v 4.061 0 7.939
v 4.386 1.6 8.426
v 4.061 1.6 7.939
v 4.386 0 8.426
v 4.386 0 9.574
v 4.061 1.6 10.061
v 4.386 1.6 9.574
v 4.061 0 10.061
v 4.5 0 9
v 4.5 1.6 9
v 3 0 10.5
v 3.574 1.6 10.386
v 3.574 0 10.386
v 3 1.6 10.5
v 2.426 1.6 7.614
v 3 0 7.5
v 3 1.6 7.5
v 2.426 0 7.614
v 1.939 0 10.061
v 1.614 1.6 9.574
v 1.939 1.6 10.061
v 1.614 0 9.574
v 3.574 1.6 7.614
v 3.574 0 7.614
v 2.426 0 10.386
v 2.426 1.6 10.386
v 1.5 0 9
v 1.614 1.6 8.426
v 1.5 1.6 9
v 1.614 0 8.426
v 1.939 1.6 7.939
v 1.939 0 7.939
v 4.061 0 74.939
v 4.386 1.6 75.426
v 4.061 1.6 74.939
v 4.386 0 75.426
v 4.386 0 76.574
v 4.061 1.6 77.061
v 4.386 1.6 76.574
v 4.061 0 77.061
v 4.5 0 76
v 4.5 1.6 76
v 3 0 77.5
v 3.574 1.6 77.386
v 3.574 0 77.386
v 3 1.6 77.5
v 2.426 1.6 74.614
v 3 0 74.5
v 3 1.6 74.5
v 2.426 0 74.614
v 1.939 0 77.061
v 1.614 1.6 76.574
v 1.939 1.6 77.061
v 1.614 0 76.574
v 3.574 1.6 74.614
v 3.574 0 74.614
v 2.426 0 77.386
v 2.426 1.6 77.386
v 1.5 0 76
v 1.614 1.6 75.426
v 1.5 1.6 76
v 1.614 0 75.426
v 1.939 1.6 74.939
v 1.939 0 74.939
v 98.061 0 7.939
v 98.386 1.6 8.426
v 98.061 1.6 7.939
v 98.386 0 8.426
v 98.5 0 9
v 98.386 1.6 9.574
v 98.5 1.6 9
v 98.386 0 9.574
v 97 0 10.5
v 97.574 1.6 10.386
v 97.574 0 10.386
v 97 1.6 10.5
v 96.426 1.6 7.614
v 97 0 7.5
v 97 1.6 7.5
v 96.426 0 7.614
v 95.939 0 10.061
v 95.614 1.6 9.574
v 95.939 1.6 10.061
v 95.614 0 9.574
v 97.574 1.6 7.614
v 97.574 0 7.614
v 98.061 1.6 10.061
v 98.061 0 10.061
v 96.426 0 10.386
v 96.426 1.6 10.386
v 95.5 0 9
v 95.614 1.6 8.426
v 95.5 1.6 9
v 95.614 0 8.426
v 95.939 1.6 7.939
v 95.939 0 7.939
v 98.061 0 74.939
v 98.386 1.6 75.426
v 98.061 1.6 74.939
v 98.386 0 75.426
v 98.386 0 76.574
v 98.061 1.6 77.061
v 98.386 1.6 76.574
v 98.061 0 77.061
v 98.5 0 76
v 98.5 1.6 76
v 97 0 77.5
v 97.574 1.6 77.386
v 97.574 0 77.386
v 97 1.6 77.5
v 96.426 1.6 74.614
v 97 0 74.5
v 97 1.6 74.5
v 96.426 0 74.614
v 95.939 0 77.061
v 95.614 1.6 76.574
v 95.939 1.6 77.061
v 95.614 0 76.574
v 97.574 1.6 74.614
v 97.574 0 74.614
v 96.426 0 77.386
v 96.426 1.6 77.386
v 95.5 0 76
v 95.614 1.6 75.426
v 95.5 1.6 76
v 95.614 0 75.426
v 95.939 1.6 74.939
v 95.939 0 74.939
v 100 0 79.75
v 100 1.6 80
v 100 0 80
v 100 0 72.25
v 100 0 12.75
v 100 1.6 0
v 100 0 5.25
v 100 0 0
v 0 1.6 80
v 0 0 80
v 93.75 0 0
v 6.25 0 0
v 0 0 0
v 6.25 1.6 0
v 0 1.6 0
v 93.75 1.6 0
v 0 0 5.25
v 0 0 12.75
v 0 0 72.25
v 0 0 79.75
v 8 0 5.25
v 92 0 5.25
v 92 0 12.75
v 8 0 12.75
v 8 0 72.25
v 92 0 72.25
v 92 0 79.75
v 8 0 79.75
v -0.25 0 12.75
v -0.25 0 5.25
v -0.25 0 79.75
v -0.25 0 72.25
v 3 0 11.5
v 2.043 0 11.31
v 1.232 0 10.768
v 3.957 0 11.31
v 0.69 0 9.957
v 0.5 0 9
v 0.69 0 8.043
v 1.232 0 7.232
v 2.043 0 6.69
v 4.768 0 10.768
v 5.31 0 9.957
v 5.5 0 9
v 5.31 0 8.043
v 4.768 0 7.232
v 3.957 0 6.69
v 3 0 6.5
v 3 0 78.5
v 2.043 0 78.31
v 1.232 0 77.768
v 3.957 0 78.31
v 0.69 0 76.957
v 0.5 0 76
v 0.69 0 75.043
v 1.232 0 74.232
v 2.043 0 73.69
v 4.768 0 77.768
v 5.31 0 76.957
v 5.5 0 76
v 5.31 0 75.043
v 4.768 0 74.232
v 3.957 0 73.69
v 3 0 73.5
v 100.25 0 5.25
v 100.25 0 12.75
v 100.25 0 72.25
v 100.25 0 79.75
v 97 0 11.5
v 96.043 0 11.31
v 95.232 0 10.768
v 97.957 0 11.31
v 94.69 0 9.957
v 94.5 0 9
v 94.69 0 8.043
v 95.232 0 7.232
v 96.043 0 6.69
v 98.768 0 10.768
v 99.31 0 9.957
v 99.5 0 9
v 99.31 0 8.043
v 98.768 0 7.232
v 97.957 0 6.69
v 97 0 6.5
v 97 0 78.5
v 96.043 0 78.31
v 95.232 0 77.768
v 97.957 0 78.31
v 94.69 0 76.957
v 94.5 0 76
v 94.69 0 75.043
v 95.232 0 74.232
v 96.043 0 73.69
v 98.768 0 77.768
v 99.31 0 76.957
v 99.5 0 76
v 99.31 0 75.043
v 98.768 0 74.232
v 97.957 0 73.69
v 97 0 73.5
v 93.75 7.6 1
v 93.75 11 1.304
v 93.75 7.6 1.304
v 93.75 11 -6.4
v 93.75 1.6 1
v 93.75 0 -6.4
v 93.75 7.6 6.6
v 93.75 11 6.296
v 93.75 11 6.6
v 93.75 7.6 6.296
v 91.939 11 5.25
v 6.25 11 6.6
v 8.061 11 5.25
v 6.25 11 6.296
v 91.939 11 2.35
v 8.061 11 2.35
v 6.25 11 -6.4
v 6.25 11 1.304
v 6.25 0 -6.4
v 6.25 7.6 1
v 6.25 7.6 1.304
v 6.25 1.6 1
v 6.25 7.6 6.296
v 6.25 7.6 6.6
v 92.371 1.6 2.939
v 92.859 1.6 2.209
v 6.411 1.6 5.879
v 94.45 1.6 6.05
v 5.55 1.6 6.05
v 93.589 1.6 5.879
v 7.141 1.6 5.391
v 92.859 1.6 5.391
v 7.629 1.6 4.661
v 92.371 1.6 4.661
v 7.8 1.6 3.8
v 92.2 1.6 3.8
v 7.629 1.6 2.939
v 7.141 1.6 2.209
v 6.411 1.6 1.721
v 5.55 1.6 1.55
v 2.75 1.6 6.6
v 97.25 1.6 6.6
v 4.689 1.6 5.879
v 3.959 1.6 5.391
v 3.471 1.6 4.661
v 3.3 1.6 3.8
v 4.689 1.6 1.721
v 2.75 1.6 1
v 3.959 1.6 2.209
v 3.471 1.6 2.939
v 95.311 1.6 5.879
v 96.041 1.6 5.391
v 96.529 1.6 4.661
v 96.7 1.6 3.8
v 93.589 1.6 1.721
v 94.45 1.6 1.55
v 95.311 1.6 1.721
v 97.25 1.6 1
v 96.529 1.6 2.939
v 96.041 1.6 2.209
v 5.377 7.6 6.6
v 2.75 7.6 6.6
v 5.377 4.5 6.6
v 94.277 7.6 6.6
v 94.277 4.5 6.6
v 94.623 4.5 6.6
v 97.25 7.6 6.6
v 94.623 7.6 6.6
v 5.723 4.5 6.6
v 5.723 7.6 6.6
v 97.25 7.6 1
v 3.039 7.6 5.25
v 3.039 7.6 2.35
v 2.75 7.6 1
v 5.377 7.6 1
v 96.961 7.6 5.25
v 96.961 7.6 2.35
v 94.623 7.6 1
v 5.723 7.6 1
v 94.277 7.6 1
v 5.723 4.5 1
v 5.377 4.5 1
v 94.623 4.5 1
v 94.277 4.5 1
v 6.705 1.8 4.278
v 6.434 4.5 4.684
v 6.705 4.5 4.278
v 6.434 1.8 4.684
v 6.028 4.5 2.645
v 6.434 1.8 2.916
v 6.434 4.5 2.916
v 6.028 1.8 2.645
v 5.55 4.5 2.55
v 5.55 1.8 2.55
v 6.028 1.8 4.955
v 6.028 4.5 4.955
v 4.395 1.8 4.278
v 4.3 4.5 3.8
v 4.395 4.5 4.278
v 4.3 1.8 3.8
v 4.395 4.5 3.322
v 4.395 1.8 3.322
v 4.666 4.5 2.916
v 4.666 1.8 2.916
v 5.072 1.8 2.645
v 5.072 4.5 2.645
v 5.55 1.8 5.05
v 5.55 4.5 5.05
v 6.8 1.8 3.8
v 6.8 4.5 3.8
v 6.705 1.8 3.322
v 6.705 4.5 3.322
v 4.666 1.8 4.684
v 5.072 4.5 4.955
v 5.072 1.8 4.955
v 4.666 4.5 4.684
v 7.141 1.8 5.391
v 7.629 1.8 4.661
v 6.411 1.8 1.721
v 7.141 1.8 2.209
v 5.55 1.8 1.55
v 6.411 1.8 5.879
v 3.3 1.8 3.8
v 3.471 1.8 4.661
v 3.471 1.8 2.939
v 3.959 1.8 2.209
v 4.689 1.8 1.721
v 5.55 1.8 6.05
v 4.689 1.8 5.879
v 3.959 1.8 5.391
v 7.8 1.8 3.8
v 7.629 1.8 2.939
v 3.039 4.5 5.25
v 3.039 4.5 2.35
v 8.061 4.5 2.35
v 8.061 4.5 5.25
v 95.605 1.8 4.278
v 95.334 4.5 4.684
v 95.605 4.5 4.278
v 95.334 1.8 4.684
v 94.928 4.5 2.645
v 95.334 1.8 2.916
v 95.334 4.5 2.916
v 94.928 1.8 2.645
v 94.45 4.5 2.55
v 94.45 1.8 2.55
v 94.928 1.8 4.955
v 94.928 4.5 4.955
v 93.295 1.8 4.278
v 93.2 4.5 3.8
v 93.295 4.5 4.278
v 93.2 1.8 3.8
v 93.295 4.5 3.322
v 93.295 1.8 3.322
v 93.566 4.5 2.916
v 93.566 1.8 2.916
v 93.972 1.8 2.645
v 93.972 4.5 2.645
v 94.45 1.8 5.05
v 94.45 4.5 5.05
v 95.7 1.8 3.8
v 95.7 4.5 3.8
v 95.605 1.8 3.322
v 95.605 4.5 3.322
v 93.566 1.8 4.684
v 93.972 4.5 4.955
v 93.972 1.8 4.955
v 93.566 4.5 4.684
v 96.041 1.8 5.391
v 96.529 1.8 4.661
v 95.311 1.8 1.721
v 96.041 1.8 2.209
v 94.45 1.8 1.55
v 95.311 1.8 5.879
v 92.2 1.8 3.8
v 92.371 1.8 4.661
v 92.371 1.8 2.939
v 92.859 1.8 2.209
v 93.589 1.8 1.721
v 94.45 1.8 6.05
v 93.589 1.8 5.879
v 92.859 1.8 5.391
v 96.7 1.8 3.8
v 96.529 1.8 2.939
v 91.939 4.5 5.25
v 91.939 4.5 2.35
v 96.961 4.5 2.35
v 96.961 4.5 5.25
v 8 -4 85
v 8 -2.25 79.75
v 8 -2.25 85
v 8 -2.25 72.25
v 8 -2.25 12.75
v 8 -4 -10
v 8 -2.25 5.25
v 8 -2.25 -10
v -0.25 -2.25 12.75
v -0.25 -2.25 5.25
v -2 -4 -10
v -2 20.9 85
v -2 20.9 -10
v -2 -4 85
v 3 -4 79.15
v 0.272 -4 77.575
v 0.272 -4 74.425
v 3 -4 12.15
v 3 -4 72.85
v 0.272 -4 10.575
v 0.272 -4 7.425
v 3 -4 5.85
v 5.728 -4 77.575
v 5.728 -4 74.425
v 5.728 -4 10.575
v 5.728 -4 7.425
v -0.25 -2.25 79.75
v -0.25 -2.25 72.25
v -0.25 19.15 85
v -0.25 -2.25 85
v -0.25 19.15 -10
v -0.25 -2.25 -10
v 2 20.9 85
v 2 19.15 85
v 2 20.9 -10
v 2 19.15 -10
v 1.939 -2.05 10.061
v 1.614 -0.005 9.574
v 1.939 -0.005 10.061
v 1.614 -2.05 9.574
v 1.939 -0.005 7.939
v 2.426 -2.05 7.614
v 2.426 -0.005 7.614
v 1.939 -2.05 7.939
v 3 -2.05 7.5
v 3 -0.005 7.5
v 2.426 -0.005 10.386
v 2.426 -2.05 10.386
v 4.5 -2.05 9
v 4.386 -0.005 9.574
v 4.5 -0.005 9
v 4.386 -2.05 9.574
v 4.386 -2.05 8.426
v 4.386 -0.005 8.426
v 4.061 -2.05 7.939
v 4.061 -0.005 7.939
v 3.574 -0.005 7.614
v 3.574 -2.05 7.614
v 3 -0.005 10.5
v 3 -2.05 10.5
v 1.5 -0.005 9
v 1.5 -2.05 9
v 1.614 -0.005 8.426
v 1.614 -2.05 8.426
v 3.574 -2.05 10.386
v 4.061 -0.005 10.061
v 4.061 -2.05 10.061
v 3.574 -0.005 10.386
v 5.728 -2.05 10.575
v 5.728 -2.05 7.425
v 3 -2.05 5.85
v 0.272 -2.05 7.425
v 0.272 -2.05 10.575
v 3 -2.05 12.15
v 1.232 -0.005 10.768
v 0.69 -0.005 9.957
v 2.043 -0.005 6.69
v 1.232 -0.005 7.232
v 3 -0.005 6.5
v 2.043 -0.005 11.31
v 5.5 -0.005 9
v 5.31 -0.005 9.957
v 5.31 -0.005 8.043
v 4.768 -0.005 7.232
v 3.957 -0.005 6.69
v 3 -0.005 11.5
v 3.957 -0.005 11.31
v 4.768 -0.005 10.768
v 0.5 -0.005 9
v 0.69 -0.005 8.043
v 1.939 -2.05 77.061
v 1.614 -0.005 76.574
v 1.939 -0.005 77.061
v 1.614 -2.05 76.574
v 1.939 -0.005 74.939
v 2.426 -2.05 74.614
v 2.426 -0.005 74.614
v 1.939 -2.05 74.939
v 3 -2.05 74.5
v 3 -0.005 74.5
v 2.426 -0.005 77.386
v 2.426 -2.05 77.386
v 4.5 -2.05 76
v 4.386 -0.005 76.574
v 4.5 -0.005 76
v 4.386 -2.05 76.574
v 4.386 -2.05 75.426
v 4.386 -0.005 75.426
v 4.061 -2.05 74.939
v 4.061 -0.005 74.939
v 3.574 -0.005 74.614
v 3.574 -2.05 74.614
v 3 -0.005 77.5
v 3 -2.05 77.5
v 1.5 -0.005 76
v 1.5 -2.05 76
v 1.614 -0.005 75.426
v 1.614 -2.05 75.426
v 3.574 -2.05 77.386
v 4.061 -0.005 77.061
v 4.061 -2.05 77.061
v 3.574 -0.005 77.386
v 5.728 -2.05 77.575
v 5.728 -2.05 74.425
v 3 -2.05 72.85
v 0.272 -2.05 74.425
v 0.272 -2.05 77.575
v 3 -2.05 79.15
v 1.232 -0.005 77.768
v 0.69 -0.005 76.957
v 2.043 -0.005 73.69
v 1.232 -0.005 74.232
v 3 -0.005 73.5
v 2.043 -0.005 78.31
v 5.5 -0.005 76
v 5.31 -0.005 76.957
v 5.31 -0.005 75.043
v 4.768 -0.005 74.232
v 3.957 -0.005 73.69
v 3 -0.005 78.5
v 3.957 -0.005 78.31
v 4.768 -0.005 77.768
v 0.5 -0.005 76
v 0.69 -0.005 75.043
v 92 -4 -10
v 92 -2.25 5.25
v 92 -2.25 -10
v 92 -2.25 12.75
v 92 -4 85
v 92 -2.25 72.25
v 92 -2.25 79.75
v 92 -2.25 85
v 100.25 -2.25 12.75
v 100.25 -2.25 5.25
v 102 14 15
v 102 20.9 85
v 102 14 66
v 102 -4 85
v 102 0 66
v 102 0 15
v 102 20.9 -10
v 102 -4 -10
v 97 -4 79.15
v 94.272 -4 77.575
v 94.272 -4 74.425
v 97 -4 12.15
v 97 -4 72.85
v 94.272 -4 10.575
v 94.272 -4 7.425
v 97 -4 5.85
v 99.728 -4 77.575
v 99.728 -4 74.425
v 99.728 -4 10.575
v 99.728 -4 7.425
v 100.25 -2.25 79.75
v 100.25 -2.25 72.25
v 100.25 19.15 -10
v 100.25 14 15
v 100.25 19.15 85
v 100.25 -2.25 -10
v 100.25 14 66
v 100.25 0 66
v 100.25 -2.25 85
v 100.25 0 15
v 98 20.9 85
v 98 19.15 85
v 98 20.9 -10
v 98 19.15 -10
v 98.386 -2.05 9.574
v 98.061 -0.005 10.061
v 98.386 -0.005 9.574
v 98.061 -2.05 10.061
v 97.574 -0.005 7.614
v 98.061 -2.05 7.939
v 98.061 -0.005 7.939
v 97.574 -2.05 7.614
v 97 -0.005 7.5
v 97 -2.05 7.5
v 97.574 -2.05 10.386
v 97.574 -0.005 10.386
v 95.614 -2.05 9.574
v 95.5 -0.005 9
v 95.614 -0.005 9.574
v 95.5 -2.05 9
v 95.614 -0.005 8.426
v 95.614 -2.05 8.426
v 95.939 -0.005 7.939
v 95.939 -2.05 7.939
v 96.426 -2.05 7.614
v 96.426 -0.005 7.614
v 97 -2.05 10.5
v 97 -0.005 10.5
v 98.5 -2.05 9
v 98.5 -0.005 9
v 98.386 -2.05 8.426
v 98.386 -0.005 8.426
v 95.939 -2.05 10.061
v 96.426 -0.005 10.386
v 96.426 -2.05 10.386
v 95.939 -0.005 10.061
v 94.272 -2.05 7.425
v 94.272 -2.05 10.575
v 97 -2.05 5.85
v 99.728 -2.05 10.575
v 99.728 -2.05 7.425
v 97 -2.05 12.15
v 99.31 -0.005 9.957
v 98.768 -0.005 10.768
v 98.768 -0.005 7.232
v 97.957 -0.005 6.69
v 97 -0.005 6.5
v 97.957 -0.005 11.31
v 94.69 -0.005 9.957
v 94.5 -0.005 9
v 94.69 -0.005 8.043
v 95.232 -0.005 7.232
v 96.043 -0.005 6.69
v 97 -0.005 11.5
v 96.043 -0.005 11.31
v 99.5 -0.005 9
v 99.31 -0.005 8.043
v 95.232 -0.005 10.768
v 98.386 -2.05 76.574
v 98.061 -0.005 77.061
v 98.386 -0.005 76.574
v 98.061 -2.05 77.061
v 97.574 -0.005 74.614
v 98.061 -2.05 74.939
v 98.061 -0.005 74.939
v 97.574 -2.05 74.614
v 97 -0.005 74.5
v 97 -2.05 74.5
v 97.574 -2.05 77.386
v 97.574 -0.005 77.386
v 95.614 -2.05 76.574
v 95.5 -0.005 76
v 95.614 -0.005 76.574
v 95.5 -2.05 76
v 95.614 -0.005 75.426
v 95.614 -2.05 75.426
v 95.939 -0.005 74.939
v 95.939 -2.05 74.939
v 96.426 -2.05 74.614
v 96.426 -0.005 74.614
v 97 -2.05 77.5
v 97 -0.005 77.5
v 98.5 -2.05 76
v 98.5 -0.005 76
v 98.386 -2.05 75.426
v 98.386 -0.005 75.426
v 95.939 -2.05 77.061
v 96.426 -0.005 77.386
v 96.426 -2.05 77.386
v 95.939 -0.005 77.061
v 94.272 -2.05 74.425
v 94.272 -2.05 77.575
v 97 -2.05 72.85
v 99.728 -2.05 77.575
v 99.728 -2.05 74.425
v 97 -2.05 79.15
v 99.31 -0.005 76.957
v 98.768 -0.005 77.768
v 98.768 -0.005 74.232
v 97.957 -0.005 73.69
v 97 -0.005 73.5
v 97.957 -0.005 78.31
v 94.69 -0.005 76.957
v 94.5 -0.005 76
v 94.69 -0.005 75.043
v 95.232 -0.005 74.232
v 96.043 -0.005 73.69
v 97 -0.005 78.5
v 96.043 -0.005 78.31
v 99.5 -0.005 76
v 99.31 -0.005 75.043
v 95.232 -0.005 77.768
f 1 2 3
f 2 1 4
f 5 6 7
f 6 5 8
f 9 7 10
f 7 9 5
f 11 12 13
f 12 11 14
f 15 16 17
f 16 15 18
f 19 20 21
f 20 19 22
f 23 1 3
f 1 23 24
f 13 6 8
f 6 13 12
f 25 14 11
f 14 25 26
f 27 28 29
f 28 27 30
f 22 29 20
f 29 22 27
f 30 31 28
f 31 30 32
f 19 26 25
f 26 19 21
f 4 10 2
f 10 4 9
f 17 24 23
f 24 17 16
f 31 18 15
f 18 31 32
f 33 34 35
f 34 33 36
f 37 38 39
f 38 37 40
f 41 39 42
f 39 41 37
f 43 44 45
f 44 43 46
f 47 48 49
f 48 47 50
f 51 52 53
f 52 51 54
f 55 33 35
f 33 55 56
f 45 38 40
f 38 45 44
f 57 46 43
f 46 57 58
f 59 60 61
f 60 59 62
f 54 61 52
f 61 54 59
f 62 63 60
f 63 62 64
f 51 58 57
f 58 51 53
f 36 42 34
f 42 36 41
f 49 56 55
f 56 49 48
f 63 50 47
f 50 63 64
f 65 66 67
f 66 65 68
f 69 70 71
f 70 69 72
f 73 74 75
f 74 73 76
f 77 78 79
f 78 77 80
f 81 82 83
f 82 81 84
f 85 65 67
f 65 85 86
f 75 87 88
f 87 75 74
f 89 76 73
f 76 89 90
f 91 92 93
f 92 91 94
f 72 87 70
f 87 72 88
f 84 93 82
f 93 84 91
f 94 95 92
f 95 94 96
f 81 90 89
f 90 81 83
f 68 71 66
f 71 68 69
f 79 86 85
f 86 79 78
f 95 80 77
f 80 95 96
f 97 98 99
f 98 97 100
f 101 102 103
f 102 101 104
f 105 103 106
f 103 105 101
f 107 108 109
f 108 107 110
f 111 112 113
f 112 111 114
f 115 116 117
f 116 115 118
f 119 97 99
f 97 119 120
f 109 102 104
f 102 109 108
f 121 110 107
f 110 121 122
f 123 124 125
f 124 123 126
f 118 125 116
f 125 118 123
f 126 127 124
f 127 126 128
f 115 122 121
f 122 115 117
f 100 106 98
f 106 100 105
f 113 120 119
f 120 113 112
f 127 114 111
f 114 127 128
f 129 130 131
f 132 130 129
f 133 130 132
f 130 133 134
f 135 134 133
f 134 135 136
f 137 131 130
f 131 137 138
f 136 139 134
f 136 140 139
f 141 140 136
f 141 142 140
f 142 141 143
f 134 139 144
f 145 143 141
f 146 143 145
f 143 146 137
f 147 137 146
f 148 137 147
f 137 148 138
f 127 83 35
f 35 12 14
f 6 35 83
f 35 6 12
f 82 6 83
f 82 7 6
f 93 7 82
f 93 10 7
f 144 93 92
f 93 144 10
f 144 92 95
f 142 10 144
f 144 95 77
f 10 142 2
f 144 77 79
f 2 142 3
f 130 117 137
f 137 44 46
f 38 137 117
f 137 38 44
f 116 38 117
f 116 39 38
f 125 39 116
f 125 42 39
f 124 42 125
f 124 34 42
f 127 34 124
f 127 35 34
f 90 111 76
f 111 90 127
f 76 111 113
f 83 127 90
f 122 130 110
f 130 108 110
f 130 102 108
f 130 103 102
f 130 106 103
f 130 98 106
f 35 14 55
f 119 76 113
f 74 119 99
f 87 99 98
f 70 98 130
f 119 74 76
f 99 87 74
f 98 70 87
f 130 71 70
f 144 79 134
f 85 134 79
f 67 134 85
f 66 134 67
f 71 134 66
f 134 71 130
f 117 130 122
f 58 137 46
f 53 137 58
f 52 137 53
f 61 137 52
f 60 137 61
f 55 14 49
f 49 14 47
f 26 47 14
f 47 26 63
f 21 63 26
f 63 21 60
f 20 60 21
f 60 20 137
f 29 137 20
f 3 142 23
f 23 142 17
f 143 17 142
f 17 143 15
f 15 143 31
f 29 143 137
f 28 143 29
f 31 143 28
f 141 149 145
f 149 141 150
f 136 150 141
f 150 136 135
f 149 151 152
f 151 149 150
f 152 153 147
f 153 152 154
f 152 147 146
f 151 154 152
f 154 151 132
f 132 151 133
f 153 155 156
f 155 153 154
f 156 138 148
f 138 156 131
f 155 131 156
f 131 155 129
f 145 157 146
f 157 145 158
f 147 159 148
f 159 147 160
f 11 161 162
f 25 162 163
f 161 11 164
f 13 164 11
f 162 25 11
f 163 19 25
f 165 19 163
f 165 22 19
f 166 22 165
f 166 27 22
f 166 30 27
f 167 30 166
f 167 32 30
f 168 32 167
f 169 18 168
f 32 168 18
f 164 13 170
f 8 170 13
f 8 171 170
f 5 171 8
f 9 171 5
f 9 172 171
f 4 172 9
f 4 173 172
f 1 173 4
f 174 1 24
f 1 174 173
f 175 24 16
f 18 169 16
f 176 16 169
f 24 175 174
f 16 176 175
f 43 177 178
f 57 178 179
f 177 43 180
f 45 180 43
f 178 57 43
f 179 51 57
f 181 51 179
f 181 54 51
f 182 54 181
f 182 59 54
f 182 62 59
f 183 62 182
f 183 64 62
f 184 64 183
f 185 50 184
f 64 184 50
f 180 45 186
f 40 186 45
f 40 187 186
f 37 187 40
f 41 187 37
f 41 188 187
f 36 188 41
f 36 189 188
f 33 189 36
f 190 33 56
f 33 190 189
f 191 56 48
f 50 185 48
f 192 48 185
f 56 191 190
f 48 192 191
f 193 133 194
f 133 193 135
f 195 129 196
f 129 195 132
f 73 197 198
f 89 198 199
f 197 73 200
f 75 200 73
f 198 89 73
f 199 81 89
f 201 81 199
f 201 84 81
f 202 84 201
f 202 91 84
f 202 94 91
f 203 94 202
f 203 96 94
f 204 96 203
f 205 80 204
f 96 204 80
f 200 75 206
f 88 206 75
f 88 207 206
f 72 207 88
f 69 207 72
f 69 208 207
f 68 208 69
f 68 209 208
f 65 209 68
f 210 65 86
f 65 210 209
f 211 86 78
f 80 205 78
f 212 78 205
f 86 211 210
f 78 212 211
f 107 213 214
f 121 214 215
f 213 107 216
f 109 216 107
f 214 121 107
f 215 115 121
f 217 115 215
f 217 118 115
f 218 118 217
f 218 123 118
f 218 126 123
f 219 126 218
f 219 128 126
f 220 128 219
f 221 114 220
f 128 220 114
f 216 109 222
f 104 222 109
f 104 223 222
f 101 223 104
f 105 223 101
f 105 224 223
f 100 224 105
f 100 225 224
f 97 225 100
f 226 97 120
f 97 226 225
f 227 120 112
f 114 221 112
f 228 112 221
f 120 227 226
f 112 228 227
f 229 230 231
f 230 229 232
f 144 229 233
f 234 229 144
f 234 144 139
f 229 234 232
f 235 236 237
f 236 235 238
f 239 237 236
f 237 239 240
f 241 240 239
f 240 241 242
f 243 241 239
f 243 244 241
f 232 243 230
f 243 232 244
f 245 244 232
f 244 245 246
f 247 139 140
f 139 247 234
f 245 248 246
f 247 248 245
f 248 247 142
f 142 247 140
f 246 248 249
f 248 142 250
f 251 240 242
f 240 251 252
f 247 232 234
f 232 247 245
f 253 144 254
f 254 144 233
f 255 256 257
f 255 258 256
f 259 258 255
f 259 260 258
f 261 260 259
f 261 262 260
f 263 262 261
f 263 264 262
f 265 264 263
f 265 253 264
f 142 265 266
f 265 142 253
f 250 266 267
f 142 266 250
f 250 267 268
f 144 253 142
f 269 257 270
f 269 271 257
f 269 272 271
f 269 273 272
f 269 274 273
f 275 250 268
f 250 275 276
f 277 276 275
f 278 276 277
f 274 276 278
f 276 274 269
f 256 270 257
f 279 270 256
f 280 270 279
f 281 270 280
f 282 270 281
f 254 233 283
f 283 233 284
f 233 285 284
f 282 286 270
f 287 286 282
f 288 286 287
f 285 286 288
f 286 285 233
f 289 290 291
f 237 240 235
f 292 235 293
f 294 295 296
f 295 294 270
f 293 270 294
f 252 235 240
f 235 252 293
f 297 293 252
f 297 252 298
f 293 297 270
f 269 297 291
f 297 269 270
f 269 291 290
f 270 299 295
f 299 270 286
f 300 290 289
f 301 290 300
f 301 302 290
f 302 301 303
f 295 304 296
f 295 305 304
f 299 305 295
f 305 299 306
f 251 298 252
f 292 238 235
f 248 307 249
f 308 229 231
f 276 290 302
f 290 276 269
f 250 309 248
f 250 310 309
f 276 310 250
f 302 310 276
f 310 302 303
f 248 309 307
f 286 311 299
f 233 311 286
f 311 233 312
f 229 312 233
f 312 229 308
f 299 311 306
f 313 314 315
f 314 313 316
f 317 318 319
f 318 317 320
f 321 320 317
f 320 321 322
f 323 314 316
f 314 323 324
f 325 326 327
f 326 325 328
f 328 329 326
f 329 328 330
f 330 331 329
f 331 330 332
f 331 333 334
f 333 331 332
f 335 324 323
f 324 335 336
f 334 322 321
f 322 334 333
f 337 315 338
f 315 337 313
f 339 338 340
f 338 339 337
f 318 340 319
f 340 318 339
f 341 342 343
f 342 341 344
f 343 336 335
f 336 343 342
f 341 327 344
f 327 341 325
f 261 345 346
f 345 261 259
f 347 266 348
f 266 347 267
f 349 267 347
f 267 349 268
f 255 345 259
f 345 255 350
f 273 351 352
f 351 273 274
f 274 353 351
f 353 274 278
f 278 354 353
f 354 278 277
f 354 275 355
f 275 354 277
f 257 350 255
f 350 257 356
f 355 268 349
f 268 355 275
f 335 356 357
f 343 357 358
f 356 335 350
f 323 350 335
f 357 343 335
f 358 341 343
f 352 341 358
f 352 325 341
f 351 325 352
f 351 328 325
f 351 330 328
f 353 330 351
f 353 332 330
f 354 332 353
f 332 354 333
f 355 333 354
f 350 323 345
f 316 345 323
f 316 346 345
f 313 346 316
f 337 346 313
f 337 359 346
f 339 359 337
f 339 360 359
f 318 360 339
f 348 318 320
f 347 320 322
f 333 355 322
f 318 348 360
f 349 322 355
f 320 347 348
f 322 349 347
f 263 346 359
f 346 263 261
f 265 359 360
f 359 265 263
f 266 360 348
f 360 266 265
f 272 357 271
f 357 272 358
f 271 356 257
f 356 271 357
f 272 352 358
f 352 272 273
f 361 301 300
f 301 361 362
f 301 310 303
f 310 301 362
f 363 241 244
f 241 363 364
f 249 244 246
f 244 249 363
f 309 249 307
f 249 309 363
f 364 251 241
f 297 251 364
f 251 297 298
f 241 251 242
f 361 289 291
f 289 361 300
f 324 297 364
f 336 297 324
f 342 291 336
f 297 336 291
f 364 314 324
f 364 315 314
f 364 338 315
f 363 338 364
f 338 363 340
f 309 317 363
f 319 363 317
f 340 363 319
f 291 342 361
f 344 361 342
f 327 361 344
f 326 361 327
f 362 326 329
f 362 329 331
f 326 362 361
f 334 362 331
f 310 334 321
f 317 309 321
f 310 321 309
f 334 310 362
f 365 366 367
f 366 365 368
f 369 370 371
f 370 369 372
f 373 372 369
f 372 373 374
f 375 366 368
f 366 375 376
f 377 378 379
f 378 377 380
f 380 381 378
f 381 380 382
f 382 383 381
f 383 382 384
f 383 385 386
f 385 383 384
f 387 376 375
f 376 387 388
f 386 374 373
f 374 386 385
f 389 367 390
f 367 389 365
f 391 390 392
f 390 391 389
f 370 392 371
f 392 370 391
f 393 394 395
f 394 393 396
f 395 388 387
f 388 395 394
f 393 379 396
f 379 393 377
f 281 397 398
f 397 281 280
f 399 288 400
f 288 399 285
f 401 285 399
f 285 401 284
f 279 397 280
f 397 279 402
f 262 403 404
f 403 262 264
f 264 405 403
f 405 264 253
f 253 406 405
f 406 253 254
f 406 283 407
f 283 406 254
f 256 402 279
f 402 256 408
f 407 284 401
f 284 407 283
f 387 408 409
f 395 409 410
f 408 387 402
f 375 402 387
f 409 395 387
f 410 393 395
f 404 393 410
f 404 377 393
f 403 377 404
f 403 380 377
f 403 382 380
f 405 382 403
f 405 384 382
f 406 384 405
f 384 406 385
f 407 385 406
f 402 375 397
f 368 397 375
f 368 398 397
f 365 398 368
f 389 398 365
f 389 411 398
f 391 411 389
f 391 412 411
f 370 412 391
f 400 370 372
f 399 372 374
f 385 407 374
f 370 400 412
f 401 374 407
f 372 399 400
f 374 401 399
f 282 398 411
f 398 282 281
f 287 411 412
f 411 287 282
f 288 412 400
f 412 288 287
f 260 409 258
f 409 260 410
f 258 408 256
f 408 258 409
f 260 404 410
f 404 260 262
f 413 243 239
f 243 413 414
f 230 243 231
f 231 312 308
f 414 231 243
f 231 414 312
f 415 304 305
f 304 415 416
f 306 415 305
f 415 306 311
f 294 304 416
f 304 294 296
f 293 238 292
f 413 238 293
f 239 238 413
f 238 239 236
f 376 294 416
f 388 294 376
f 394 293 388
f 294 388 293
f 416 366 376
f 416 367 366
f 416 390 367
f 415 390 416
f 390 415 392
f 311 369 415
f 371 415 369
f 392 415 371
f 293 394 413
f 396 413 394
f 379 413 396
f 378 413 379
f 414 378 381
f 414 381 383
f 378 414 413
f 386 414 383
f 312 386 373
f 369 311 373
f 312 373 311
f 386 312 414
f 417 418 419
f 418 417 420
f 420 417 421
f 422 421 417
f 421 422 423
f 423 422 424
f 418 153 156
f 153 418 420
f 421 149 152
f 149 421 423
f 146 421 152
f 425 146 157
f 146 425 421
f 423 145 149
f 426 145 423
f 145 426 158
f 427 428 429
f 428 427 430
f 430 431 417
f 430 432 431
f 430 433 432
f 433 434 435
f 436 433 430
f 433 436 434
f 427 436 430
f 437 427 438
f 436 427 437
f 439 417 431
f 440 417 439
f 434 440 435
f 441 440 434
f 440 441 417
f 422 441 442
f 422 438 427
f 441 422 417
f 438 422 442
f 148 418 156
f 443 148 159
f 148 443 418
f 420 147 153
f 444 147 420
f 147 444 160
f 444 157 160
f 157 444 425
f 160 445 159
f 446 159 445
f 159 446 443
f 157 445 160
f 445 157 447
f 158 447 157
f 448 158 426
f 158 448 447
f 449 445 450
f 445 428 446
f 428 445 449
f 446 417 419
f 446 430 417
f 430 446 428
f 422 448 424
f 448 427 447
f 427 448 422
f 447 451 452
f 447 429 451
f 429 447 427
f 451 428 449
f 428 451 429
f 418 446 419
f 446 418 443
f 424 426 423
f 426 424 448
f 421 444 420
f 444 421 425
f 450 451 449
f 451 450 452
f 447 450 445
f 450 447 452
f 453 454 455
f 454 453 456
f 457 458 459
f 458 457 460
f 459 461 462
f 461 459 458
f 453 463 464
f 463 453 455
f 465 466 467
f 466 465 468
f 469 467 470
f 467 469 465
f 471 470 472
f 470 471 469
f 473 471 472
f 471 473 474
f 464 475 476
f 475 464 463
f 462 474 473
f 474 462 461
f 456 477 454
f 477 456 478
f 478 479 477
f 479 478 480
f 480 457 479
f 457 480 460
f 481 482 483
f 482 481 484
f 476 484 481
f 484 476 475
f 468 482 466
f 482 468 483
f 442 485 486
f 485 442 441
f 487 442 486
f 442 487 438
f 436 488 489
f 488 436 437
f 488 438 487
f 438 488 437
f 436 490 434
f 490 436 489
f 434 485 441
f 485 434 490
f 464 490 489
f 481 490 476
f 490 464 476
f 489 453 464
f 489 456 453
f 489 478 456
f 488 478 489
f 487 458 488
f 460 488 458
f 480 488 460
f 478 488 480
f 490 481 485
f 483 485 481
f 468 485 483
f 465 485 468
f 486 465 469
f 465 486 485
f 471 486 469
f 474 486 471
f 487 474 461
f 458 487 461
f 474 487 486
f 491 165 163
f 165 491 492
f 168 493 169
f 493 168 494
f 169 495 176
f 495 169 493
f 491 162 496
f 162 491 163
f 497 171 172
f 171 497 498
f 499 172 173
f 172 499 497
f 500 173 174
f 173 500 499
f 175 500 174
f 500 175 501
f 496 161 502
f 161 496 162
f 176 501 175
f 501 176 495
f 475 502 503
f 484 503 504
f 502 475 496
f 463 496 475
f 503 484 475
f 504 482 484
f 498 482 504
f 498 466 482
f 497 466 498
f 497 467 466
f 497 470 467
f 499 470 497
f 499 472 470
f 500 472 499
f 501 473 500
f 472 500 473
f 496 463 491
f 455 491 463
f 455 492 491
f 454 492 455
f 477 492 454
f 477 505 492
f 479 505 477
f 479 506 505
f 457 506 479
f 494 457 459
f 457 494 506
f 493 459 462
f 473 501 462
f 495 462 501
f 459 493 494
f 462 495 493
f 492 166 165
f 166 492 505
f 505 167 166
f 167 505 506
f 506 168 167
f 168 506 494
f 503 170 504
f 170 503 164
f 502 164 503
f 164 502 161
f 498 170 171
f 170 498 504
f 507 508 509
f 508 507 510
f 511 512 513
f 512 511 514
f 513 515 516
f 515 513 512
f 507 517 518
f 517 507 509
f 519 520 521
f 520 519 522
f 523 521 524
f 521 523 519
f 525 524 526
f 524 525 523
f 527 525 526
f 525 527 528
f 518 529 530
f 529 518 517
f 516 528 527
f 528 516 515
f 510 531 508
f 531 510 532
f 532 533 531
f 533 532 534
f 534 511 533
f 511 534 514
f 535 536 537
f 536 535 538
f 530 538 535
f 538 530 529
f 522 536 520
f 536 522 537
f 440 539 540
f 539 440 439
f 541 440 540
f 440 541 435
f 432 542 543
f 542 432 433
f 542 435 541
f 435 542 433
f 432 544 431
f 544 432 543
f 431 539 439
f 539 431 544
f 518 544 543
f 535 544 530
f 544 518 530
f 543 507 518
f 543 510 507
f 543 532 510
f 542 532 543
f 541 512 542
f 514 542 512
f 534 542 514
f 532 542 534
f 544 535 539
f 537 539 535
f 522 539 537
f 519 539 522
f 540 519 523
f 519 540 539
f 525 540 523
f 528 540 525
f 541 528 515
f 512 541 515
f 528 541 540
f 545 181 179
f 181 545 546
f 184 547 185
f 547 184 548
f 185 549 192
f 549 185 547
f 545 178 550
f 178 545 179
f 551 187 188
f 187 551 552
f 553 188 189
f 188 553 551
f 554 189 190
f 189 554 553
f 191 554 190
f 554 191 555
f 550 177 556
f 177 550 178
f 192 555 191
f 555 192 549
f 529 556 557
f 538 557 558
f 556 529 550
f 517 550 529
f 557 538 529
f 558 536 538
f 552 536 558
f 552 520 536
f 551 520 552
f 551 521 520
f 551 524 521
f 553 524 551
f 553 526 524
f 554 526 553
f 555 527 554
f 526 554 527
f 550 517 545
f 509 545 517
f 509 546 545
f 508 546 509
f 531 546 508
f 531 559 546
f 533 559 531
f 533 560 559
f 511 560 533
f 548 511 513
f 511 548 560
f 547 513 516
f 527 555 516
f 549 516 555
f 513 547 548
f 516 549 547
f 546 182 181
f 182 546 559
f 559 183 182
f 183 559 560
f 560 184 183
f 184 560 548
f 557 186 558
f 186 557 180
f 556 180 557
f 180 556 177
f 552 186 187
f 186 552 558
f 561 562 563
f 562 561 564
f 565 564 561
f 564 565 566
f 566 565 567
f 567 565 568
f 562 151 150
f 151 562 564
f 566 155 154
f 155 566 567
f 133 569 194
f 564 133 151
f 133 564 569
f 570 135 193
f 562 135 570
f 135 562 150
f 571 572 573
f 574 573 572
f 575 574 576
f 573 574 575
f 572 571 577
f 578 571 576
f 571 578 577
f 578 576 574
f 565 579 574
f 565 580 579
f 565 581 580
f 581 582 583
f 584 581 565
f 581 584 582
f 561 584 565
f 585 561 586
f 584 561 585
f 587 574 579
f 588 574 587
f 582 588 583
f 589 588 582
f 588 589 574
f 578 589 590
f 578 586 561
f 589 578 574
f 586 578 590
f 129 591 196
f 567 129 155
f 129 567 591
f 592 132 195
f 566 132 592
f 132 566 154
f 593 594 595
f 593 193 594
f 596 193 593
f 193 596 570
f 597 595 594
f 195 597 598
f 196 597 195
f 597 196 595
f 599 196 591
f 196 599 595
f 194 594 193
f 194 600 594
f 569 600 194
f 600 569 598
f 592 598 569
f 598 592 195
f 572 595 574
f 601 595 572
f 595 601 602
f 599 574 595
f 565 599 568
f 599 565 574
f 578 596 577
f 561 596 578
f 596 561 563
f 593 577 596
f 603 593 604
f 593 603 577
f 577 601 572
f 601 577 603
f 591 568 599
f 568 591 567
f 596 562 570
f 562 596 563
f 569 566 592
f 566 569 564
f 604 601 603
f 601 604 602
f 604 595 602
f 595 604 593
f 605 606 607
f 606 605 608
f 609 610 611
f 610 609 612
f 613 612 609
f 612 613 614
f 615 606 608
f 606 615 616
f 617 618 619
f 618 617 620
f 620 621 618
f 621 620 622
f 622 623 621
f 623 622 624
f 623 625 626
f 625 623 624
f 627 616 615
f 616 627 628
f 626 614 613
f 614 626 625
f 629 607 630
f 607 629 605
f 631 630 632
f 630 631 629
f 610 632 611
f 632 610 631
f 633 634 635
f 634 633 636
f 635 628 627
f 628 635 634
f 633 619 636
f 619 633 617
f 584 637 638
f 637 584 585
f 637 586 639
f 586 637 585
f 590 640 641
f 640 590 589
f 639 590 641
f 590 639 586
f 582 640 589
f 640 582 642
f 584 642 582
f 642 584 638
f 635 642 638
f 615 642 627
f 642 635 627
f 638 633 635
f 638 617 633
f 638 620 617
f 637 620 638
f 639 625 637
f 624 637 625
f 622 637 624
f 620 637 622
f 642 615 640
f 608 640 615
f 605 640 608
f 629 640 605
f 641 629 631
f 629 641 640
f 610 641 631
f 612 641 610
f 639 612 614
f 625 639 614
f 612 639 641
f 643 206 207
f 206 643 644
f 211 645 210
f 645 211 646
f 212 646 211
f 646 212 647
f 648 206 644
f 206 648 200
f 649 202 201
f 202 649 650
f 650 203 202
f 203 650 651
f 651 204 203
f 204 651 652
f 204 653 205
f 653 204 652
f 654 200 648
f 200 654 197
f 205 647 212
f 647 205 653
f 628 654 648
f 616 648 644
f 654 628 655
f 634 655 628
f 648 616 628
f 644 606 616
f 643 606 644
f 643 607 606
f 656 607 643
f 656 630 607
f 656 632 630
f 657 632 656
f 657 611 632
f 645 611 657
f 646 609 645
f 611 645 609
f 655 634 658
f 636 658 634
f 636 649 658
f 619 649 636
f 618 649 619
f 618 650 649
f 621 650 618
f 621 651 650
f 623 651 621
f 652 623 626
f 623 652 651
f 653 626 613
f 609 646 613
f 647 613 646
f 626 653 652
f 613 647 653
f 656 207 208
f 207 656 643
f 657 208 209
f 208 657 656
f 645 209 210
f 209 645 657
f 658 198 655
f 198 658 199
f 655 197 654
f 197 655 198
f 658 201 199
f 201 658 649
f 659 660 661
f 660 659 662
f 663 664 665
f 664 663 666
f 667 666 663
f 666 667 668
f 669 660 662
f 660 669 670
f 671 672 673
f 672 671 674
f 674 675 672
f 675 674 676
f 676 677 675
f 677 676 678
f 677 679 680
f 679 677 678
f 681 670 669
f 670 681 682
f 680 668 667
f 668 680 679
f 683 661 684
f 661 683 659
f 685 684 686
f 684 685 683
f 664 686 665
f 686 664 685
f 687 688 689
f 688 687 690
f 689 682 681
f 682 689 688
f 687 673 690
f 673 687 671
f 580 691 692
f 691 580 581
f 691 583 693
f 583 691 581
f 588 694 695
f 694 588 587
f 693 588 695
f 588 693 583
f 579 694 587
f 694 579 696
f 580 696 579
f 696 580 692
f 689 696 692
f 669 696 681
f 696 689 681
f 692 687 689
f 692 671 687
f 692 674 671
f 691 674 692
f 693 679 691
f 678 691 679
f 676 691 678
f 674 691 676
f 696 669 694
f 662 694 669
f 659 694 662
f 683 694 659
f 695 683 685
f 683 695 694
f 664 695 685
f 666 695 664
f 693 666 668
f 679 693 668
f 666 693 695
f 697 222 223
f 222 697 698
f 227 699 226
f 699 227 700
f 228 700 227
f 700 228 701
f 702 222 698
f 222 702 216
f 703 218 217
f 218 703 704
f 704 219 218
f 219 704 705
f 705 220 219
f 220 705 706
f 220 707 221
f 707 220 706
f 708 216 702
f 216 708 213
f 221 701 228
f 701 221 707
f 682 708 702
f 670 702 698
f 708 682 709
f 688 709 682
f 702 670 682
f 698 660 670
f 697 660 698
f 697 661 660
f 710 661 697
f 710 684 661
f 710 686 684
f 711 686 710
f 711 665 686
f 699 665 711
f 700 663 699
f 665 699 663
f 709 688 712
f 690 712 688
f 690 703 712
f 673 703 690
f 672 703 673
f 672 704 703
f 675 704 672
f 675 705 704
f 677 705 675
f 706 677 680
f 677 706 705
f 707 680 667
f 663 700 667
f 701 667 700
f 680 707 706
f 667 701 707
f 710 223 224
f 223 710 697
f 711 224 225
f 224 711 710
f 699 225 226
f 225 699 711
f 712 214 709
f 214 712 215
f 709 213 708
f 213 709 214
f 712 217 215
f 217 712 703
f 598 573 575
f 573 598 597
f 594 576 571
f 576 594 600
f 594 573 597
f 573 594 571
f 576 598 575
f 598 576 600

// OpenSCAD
// file: ../library/din41612/din41612_male.scad
// din41612 male connector
// =======================

include <din41612_male_dim.scad>

use <../linurs/linurs_screw.scad>

module din41612_male(){ 
  // color("LightGrey")
  difference(){
    union(){
        translate([0,din41612_male_w1/2,din41612_male_h/2-din41612_male_h1])  
        cube([din41612_male_l1,
              din41612_male_w1,
              din41612_male_h],
             center=true);  
      translate([0,(din41612_male_w1-din41612_male_w)/2,(din41612_male_h-din41612_male_h1)/2]) 
        cube([din41612_male_l1,
              (din41612_male_w-din41612_male_w1),
              din41612_male_h-din41612_male_h1],
             center=true);  
      translate([0,din41612_male_w2/2+din41612_male_w1-din41612_male_w,din41612_male_h2/2])
        cube([din41612_male_l,
              din41612_male_w2,
              din41612_male_h2],
             center=true);  
    }
    for(i=[-1,1]){ // mounting holes
      translate([i*din41612_male_dl/2,
                 din41612_male_w1-din41612_male_w+din41612_male_w2/2, 
                 din41612_male_h1])
      rotate([180,0,90])screw_fix(
            w=din41612_male_h2, 
            d=M2_5, 
            type=head_cyl, 
            nut_sink=din41612_male_h,
            t=0);
    }
  }
}
din41612_male();  
// file: ../library/din41612/din41612_male_dim.scad
include <../linurs/linurs_screw_dim.scad>

// connector dimensions
din41612_male_l=94.5;    // lenght of the connector
din41612_male_l1=87.5;   // 
din41612_male_w=13;      // width of the connector
din41612_male_w1=6.4;    // 
din41612_male_w2=5.6;    // 
din41612_male_h=11;      // height of the connector
din41612_male_h1=1.6;    // 
din41612_male_h2=6;      // 

din41612_male_dl=88.9;   // distance between mounting holes
// file: ../library/din41612/din41612_female_dim.scad
include <../linurs/linurs_screw_dim.scad>

// connector dimensions
din41612_female_l=95;       // lenght of the connector
din41612_female_l1=85;      // lenght of the connector head
din41612_female_h=11.6;     // height of the connector
din41612_female_h1=5.2;     // height produced by the connector when pulgged in 
din41612_female_w=11;       // width of the connector
din41612_female_w1=8.5;     // width of the connector head

din41612_female_dl=90;      // distance between mounting holes
// file: ../pcb/pcb.scad
// pcb
// ===
// The pcb is the master object and has its 
// lower left corner solder side at the origin of the 
// coordinate system 

n=2;  // [1,2,3,4,5,6,7,8]
show_pcb="assemblies"; // [assemblies,assembly,pcb]

include <pcb_dim.scad>
include <../motherboard/motherboard_dim.scad>

use <../library/din41612/din41612_male.scad>

module pcb(){
  echo("pcb");  
  color("greenyellow")
  difference(){
    cube([pcb_l,pcb_h,pcb_w]); // pcb
    for(x=[-1,1]){ // mounting holes
      for(y=[pcb_wd1,pcb_wd1+pcb_wd]){
        translate([x*pcb_ld/2+pcb_l/2,0,y])
        rotate([90,0,0])
        cylinder(d=pcb_d,h=3*pcb_h,center=true,$fn=16);
      }
    }
  }
}

module pcb_assembly(){
  echo("pcb assembly");  
  pcb();  
  translate([pcb_l/2,pcb_h,0])  
  rotate([-90,0,0])din41612_male();  
}

module pcb_assemblies(n=1){
  echo("pcb assemblies"); 
  for(i=[0:n-1]){ // add the connectors
      echo(i);
      translate([0,step*i,0])
      pcb_assembly();
  }    
}    

if(show_pcb=="assemblies"){
  pcb_assemblies(n=n);
}

if(show_pcb=="assembly"){
  pcb_assembly();
}

if(show_pcb=="pcb"){
    // Move to center to create 2D drawings from top view 
    // with script OpenSCAD22d.py
    //
    rotate([90,0,180])
    //
    translate([-pcb_l/2,-pcb_h/2,-pcb_w/2])
    pcb();
}
// file: ../bracket/bracket.scad
// bracket
// =======
// A bracket of the elecbox module
// - type: 0 front bracket, 1 rear bracket
// - width 1..n in steps

// parameters for customizer
// bracket width
n=2; // [1,2,3,4,5,6,7,8]
// type
bracket="Front"; // [Front,Back]
// intermediate mounting holes
intermediate=false;  

include <../pcb/pcb_dim.scad>

include <../motherboard/motherboard_dim.scad>
include <../library/linurs/linurs_screw_dim.scad>
include <bracket_dim.scad>

use <../library/linurs/linurs_screw.scad>
    
module back_bracket(n=1, intermediate=false){
  mirror([1,0,0])       // mirror it if desired
  front_bracket(n=n, intermediate=intermediate); 
}
    
module front_bracket(n=1, intermediate=false){
  echo("bracket");  
  //color("White")
  intermediatestep=(intermediate)?step:0; 
  difference(){
    union(){
      translate([-bracket_h2/2-bracket_gap/2,
                 bracket_w(n)/2-bracket_w1,
                 bracket_l/2])  
      cube([bracket_h2,
            bracket_w(n),
            bracket_l],center=true); // create the bracket front
  
      translate([bracket_h/2-bracket_h2-bracket_gap/2,
                 bracket_t/2-bracket_w1,
                 bracket_l/2]) 
      cube([bracket_h,
            bracket_t,
            bracket_l],center=true); // U shape side of the screw
      
      translate([bracket_h1/2-bracket_h2-bracket_gap/2,
                 bracket_w(n)-bracket_w1-bracket_t/2,
                 bracket_l/2]) 
      cube([bracket_h1,
            bracket_t,
            bracket_l],center=true); // U shape where no screw  
      for(x=[1:n]){  // create the mounting hole cubes 
        for(z=[bracket_l1,
               bracket_l1+bracket_ld]){
          translate([ bracket_h/2-bracket_h2-bracket_gap/2,
                     -bracket_w1/2+(x-1)*intermediatestep,
                     z])
          cube([bracket_h,
                bracket_w1,
                bracket_l2],center=true);
        }
      }   
    }
    for(x=[1:n]){ // create the mounting hole 
      for(z=[bracket_l1,
             bracket_l1+bracket_ld]){
        translate([bracket_h3-bracket_h2-bracket_gap/2,
                  -bracket_w1/2+(x-1)*intermediatestep,
                   z])
        rotate([0,90,0])
        rotate([-90,0,0])
        screw_fix(w=bracket_w1,d=bracket_screw,type=head_no, t=bracket_screw_gap);
      }
    }
  }
}

if(bracket=="Front"){
  front_bracket(intermediate=intermediate,n=n);
}

if(bracket=="Back"){
  back_bracket(intermediate=intermediate,n=n);
}
// file: ../library/linurs/linurs_screw.scad
// Metric screws and nuts 
// urs@linurs.org 2019
// It is targeted for 3D printing applications. 
// To look realistic is not the goal (Example: Nuts do not have a hole)

include <linurs_screw_dim.scad>

d=0; //[0:M2_5,1:M3,2:M4,3:M5]
type=0;//[0:head_cyl,1:head_cnt,2:head_no,3:head_hex]
w=15; 
i=10;
nut_sink=0;
screw_sink=0; 
t=0.01;
fn=16;

/* [hex_bolt] */
show_hex_bolt=false;

/* [nut] */
show_nut=false;

/* [screw] */
show_screw=false;

/* [screw_fix] */
show_screw_fix=false;

/* [screw_cut] */
show_screw_cut=false;

/* [nut_cut] */
show_nut_cut=false;
wi=0; 
rot=false;

// functions used multiple times to position nuts and heads
function headh_cyl(d)=screw_cyl[d][1];  // height of cyl screw head
function headh_cnt(d)=screw_cyl[d][1];  // height of cnt screw head
function headh(d,type=head_cyl)=(type==head_cyl ? headh_cyl(d) : (type==head_cnt ? headh_cnt(d) : 0 )); // height of screw head 

function nuth(d)=screw_hex[d][2];   // height of hex nut

// head of a cylinder screw
module screw_head_cyl(d=M3, t=0)
{
  screwhd=screw_cyl[d][0]+t; // diameter of cylinder screw head
  cylinder(d=screwhd,h=headh(d=d, type=head_cyl), center=true,$fn=16); // screw head
}

// head of a countersunk screw
module screw_head_cnt(d=M3, t=0)
{
  screwd=screw_d[d]+t; 
  screwhd=screw_cnt[d][0]+t; // diameter of cylinder screw head
  cylinder(d1=screwd,d2=screwhd,h=headh(d=d,type=head_cnt), center=true,$fn=16); // screw head
}

// head of a hex screw
module screw_head_hex(d=M3, t=0)
{
    translate([0,0,-nuth(d)/2])nut(d=d, t=t);
}

// head of all screws
module screw_head(d=M3, type=head_cyl, t=0)
{ 
  if(type==head_cnt){
    screw_head_cnt(d=d, t=t);
  } else {
    if(type==head_cyl){
      screw_head_cyl(d=d, t=t);
    } else {
       if(type==head_hex){
           screw_head_hex(d=d, t=t); 
       } 
    }    
  }
}

// hex bolt 
module hex_bolt(d=M3, w=10, t=0)
{
  nutd=screw_hex[d][1]+t; // outer diameter of hex bolt
  cylinder(r=nutd/2,h=w+t, center=true,$fn=6); // nut
}

// nut 
module nut(d=M3, t=0)
{
  hex_bolt(d=d, w=nuth(d), t=t);    
}

// screw 
// w outer width of the screw = screw length + head 
module screw(w=10, d=M3, type=head_cyl, t=0){
  screwd=screw_d[d]+t;       // screw diameter
  cylinder(d=screwd, h=w, center=true,$fn=16); // screw thread length
  translate([0,0,w/2-headh(d=d,type=type)/2])
  screw_head(d=d,type=type, t=t);
}

// screw fix
// w outer width of the screw = screw length + head 
// sink additional material below to remove 
// raise additional material above to remove
module screw_fix(w=10, d=M3, type=head_cyl, screw_sink=0, nut_sink=0, t=0){
  screw(w=w, d=d, type=type, t=t);
  translate([0,0,-w/2+nuth(d)/2])
    nut(d=d,t=t);
  //additional material to be removed above the nut  
  translate([0,0,-(w+nut_sink)/2])hex_bolt(d=d,w=nut_sink+0.01,t=t);    
  //additional material to be removed above the screw head
  if(type==head_cnt){  
    translate([0,0,w/2+screw_sink])
    cylinder(d=screw_cnt[d][0]+t,h=screw_sink+0.01,center=true,$fn=16);
  }else{ 
    translate([0,0,(w+screw_sink)/2])
    cylinder(d=screw_cyl[d][0]+t,h=screw_sink+0.01,center=true,$fn=16);
  }     
}

// screw cut
// material to be extracted from object to slide in a counter sunk screw for fixation
// w height of the cut out
// i depth of the screw
module screw_cut(d=M3,w=20,i=10,t=0,fn=32){
    hsh=screw_cnt[d][1];
    ws=screw_cnt[d][0]+t;
    ds=screw_d[d]+t;
    
    translate([i/2,0,-(w-hsh)/2])
      cube([i,ws,hsh],center=true);
    
    translate([0,0,-(w-hsh)/2])
      cylinder(d=ws,h=hsh,center=true,$fn=32);
    
    translate([0,0,-(w-hsh)/2+hsh])
        cylinder(d2=ds, d1=ws, h=hsh,center=true,$fn=fn);
    
    cylinder(h=w, d=ds, center=true, $fn=fn);   
    
    translate([i/2,0,0]) 
        cube([i,ds,w],center=true);
    
    for(y=[-1,1]){
        translate([i/2,y*ds/2,-w/2+hsh])
            rotate([45,0,0])
            cube([i,sqrt(2)*(ws-ds)/2,sqrt(2)*(ws-ds)/2],center=true);
    }
}
//screw_cut();

// nut cut
// material to be extracted from object to slide in a nut for fixation
// w height of the cylinder
// i lenght of the inlet
module nut_cut(w=10, wi=0, d=M3, i=10, t=0, rot=false,type=head_cyl){ 
  r=(rot)?90:0;
  ds=(rot)?screw_hex[d][1]:screw_hex[d][0];
  rotate([0,0,r])nut(d,t);
  translate([i/2,0,0])
    cube([i,ds+t,nuth(d)+t],center=true);
  translate([0,0,-wi])
      if(type==head_cnt){    
          screw(w=w, d=d, type=type, t=t); 
        translate([0,0,w/2])
          cylinder(d=screw_cnt[d][0]+t,h=raise,center=true,$fn=16);
      }
      else{ 
          screw(w=w, d=d, type=type, t=t);   
  //      translate([0,0,0])
          //#cylinder(d=screw_cyl[d][0]+t,h=w,center=true,$fn=16);
      }       
}

if(show_hex_bolt==true){
   hex_bolt(d=d, w=w, t=t);
}

if(show_nut==true){
  nut(d=d, t=t);
}    

if(show_screw==true){
   screw(w=w, d=d, type=type, t=t);
}

if(show_screw_fix==true){
  screw_fix(w=w, d=d, type=type, nut_sink=nut_sink, screw_sink=screw_sink, t=t);
}

if(show_screw_cut==true){
  screw_cut(d=d,w=w,i=i,t=t,$fn=fn);
}    

if(show_nut_cut==true){
  nut_cut(w=w, wi=wi, d=d, i=i, t=t,rot=rot,type=type);
}  
// file: ../library/linurs/linurs_screw_dim.scad
// Metric screws and nuts 
// urs@linurs.org

// contains dimensions of linurs_screw and can be included in other 
// OpenScad files 

// Parameters in this file
// d screw diameter M2_5, M3, ... (enumeration with screw_d)
// t millimeters added to diameters 

// enumerations of metric threads
M2_5=0;
M3=1;
M4=2;
M5=3;

// enumerations screw head type
head_cyl=0; // cylinder
head_cnt=1; // countrsunk
head_no=2;  // no head at all
head_hex=3;  // no head at all

// screw diameters
screw_d=[
2.5, // M2.5
3.0, // M3
4.0, // M4
5.0  // M5
];

// sizes for hex nuts
screw_hex=[
//   s,   e,   h
 [ 5.0, 5.8, 1.7], // M2.5
 [ 5.5, 6.4, 2.0], // M3
 [ 7.0, 8.1, 2.8], // M4
 [ 8.0, 9.2, 3.5]  // M5
];

// sizes for cylinder screw heads
screw_cyl=[
//   d,   h
 [ 4.5, 1.6], // M2.5
 [ 5.5, 2.0], // M3
 [ 7.0, 2.6], // M4
 [ 8.5, 3.3]  // M5
];

// sizes for countersunk screw heads
screw_cnt=[
//   d,   h
 [ 4.7, 1.50], // M2.5
 [ 5.6, 1.65], // M3
 [ 7.4, 2.20], // M4
 [ 9.2, 2.50]  // M5
];
// file: ../motherboard/motherboard_dim.scad
include <../library/linurs/linurs_screw_dim.scad>
include <../library/din41612/din41612_female_dim.scad>
include <../library/din41612/din41612_male_dim.scad>
include <../pcb/pcb_dim.scad>
// motherboard pcb dimensions
motherboard_l=pcb_l;   // pcb width
motherboard_h=1.6;     // pcb thickness
step=25.4;             // distance between modules

function motherboard_w(n)=din41612_female_w+step*(n-1);

screw_motherboard_d=M2_5;
screw_motherboard_l=16;
motherboard_pass=0.5;// gap to fit screws 

motherboard_z_offset=-din41612_male_w1-din41612_female_h1-motherboard_h;
// file: ../bracket/bracket_dim.scad
// bracket

include <../pcb/pcb_dim.scad>
include <../motherboard/motherboard_dim.scad>
include <../library/linurs/linurs_screw_dim.scad>

bracket_screw=M2_5;   // hole for the screw

bracket_gap=0.5;      // gap between bracket to make sure it fits in the box
bracket_screw_gap=0.5;// gap to fit the screw

bracket_l=pcb_w+15;   // height of bracket
bracket_l1=19;        // hole l
bracket_l2=3*screw_d[bracket_screw];
bracket_ld=pcb_wd;    // hole distance

bracket_h=10;         // depth of the U shape at the side of the screw
bracket_h1=4;         // depth of the U shape at the side where no screw is 
bracket_h2=2-bracket_gap/2;   // thickness of bracket
bracket_h3=5;         // hole h

bracket_w1=4;         // height of the mounting hole cube
bracket_tn=2;         // thickness of bracket
bracket_t=bracket_tn-bracket_gap/2;  // thickness of bracket - gap

bracket_offset_z=-10;  // bracket offset in elecbox z axis

function bracket_w(n)=step*n-bracket_gap;
function bracket_w2(n)=step*n-2*bracket_tn;
// file: ../pcb/pcb_dim.scad
// The pcb is the master object of the project
// therefore no other include files from other objects
// are necessary

// pcb constants
pcb_l =100;  // lenght of the pcb
pcb_ld = 94; // hole distance 
pcb_w=80;    // height of the pcb
pcb_wd = 67; // hole distance
pcb_wd1 = 9; // hole to edge distance 
pcb_d=3;     // diameter of holes
pcb_h=1.6;   // thickness
// main file
// Stepper module
// ==============

Fet="assembly"; // [assembly,front,back,print_front,print_back]

include <../pcb/pcb_dim.scad>
include <../bracket/bracket_dim.scad>
include <../motherboard/motherboard_dim.scad>
include <../library/linurs/linurs_screw_dim.scad>

use <../library/linurs/linurs_screw.scad>
use <../bracket/bracket.scad>
use <../pcb/pcb.scad>

module Fet_back(){
    h1=14;
    w1=51;
    z1=15;
    
    difference(){
        translate([0,0,bracket_offset_z])back_bracket(n=1);
        
        translate([
          0,
          h1/2,
          z1+w1/2])
        cube([
          bracket_h,
          h1,
          w1],center=true); 
    }
}

module Fet_front(){
   translate([0,0,bracket_offset_z])front_bracket(n=1);
}

module Fet_assembly(){
    pcb_assembly();
    Fet_front();
    translate([pcb_l,0,0])Fet_back();
}

if(Fet=="assembly"){
  Fet_assembly();
}

if(Fet=="front"){
   Fet_front();
}

if(Fet=="print_back"){
  Fet_back();
}

if(Fet=="print_front"){
  rotate([0,-90,0])
    Fet_front();
}

if(Fet=="print_back"){
  rotate([0,90,0])Fet_back();
}
